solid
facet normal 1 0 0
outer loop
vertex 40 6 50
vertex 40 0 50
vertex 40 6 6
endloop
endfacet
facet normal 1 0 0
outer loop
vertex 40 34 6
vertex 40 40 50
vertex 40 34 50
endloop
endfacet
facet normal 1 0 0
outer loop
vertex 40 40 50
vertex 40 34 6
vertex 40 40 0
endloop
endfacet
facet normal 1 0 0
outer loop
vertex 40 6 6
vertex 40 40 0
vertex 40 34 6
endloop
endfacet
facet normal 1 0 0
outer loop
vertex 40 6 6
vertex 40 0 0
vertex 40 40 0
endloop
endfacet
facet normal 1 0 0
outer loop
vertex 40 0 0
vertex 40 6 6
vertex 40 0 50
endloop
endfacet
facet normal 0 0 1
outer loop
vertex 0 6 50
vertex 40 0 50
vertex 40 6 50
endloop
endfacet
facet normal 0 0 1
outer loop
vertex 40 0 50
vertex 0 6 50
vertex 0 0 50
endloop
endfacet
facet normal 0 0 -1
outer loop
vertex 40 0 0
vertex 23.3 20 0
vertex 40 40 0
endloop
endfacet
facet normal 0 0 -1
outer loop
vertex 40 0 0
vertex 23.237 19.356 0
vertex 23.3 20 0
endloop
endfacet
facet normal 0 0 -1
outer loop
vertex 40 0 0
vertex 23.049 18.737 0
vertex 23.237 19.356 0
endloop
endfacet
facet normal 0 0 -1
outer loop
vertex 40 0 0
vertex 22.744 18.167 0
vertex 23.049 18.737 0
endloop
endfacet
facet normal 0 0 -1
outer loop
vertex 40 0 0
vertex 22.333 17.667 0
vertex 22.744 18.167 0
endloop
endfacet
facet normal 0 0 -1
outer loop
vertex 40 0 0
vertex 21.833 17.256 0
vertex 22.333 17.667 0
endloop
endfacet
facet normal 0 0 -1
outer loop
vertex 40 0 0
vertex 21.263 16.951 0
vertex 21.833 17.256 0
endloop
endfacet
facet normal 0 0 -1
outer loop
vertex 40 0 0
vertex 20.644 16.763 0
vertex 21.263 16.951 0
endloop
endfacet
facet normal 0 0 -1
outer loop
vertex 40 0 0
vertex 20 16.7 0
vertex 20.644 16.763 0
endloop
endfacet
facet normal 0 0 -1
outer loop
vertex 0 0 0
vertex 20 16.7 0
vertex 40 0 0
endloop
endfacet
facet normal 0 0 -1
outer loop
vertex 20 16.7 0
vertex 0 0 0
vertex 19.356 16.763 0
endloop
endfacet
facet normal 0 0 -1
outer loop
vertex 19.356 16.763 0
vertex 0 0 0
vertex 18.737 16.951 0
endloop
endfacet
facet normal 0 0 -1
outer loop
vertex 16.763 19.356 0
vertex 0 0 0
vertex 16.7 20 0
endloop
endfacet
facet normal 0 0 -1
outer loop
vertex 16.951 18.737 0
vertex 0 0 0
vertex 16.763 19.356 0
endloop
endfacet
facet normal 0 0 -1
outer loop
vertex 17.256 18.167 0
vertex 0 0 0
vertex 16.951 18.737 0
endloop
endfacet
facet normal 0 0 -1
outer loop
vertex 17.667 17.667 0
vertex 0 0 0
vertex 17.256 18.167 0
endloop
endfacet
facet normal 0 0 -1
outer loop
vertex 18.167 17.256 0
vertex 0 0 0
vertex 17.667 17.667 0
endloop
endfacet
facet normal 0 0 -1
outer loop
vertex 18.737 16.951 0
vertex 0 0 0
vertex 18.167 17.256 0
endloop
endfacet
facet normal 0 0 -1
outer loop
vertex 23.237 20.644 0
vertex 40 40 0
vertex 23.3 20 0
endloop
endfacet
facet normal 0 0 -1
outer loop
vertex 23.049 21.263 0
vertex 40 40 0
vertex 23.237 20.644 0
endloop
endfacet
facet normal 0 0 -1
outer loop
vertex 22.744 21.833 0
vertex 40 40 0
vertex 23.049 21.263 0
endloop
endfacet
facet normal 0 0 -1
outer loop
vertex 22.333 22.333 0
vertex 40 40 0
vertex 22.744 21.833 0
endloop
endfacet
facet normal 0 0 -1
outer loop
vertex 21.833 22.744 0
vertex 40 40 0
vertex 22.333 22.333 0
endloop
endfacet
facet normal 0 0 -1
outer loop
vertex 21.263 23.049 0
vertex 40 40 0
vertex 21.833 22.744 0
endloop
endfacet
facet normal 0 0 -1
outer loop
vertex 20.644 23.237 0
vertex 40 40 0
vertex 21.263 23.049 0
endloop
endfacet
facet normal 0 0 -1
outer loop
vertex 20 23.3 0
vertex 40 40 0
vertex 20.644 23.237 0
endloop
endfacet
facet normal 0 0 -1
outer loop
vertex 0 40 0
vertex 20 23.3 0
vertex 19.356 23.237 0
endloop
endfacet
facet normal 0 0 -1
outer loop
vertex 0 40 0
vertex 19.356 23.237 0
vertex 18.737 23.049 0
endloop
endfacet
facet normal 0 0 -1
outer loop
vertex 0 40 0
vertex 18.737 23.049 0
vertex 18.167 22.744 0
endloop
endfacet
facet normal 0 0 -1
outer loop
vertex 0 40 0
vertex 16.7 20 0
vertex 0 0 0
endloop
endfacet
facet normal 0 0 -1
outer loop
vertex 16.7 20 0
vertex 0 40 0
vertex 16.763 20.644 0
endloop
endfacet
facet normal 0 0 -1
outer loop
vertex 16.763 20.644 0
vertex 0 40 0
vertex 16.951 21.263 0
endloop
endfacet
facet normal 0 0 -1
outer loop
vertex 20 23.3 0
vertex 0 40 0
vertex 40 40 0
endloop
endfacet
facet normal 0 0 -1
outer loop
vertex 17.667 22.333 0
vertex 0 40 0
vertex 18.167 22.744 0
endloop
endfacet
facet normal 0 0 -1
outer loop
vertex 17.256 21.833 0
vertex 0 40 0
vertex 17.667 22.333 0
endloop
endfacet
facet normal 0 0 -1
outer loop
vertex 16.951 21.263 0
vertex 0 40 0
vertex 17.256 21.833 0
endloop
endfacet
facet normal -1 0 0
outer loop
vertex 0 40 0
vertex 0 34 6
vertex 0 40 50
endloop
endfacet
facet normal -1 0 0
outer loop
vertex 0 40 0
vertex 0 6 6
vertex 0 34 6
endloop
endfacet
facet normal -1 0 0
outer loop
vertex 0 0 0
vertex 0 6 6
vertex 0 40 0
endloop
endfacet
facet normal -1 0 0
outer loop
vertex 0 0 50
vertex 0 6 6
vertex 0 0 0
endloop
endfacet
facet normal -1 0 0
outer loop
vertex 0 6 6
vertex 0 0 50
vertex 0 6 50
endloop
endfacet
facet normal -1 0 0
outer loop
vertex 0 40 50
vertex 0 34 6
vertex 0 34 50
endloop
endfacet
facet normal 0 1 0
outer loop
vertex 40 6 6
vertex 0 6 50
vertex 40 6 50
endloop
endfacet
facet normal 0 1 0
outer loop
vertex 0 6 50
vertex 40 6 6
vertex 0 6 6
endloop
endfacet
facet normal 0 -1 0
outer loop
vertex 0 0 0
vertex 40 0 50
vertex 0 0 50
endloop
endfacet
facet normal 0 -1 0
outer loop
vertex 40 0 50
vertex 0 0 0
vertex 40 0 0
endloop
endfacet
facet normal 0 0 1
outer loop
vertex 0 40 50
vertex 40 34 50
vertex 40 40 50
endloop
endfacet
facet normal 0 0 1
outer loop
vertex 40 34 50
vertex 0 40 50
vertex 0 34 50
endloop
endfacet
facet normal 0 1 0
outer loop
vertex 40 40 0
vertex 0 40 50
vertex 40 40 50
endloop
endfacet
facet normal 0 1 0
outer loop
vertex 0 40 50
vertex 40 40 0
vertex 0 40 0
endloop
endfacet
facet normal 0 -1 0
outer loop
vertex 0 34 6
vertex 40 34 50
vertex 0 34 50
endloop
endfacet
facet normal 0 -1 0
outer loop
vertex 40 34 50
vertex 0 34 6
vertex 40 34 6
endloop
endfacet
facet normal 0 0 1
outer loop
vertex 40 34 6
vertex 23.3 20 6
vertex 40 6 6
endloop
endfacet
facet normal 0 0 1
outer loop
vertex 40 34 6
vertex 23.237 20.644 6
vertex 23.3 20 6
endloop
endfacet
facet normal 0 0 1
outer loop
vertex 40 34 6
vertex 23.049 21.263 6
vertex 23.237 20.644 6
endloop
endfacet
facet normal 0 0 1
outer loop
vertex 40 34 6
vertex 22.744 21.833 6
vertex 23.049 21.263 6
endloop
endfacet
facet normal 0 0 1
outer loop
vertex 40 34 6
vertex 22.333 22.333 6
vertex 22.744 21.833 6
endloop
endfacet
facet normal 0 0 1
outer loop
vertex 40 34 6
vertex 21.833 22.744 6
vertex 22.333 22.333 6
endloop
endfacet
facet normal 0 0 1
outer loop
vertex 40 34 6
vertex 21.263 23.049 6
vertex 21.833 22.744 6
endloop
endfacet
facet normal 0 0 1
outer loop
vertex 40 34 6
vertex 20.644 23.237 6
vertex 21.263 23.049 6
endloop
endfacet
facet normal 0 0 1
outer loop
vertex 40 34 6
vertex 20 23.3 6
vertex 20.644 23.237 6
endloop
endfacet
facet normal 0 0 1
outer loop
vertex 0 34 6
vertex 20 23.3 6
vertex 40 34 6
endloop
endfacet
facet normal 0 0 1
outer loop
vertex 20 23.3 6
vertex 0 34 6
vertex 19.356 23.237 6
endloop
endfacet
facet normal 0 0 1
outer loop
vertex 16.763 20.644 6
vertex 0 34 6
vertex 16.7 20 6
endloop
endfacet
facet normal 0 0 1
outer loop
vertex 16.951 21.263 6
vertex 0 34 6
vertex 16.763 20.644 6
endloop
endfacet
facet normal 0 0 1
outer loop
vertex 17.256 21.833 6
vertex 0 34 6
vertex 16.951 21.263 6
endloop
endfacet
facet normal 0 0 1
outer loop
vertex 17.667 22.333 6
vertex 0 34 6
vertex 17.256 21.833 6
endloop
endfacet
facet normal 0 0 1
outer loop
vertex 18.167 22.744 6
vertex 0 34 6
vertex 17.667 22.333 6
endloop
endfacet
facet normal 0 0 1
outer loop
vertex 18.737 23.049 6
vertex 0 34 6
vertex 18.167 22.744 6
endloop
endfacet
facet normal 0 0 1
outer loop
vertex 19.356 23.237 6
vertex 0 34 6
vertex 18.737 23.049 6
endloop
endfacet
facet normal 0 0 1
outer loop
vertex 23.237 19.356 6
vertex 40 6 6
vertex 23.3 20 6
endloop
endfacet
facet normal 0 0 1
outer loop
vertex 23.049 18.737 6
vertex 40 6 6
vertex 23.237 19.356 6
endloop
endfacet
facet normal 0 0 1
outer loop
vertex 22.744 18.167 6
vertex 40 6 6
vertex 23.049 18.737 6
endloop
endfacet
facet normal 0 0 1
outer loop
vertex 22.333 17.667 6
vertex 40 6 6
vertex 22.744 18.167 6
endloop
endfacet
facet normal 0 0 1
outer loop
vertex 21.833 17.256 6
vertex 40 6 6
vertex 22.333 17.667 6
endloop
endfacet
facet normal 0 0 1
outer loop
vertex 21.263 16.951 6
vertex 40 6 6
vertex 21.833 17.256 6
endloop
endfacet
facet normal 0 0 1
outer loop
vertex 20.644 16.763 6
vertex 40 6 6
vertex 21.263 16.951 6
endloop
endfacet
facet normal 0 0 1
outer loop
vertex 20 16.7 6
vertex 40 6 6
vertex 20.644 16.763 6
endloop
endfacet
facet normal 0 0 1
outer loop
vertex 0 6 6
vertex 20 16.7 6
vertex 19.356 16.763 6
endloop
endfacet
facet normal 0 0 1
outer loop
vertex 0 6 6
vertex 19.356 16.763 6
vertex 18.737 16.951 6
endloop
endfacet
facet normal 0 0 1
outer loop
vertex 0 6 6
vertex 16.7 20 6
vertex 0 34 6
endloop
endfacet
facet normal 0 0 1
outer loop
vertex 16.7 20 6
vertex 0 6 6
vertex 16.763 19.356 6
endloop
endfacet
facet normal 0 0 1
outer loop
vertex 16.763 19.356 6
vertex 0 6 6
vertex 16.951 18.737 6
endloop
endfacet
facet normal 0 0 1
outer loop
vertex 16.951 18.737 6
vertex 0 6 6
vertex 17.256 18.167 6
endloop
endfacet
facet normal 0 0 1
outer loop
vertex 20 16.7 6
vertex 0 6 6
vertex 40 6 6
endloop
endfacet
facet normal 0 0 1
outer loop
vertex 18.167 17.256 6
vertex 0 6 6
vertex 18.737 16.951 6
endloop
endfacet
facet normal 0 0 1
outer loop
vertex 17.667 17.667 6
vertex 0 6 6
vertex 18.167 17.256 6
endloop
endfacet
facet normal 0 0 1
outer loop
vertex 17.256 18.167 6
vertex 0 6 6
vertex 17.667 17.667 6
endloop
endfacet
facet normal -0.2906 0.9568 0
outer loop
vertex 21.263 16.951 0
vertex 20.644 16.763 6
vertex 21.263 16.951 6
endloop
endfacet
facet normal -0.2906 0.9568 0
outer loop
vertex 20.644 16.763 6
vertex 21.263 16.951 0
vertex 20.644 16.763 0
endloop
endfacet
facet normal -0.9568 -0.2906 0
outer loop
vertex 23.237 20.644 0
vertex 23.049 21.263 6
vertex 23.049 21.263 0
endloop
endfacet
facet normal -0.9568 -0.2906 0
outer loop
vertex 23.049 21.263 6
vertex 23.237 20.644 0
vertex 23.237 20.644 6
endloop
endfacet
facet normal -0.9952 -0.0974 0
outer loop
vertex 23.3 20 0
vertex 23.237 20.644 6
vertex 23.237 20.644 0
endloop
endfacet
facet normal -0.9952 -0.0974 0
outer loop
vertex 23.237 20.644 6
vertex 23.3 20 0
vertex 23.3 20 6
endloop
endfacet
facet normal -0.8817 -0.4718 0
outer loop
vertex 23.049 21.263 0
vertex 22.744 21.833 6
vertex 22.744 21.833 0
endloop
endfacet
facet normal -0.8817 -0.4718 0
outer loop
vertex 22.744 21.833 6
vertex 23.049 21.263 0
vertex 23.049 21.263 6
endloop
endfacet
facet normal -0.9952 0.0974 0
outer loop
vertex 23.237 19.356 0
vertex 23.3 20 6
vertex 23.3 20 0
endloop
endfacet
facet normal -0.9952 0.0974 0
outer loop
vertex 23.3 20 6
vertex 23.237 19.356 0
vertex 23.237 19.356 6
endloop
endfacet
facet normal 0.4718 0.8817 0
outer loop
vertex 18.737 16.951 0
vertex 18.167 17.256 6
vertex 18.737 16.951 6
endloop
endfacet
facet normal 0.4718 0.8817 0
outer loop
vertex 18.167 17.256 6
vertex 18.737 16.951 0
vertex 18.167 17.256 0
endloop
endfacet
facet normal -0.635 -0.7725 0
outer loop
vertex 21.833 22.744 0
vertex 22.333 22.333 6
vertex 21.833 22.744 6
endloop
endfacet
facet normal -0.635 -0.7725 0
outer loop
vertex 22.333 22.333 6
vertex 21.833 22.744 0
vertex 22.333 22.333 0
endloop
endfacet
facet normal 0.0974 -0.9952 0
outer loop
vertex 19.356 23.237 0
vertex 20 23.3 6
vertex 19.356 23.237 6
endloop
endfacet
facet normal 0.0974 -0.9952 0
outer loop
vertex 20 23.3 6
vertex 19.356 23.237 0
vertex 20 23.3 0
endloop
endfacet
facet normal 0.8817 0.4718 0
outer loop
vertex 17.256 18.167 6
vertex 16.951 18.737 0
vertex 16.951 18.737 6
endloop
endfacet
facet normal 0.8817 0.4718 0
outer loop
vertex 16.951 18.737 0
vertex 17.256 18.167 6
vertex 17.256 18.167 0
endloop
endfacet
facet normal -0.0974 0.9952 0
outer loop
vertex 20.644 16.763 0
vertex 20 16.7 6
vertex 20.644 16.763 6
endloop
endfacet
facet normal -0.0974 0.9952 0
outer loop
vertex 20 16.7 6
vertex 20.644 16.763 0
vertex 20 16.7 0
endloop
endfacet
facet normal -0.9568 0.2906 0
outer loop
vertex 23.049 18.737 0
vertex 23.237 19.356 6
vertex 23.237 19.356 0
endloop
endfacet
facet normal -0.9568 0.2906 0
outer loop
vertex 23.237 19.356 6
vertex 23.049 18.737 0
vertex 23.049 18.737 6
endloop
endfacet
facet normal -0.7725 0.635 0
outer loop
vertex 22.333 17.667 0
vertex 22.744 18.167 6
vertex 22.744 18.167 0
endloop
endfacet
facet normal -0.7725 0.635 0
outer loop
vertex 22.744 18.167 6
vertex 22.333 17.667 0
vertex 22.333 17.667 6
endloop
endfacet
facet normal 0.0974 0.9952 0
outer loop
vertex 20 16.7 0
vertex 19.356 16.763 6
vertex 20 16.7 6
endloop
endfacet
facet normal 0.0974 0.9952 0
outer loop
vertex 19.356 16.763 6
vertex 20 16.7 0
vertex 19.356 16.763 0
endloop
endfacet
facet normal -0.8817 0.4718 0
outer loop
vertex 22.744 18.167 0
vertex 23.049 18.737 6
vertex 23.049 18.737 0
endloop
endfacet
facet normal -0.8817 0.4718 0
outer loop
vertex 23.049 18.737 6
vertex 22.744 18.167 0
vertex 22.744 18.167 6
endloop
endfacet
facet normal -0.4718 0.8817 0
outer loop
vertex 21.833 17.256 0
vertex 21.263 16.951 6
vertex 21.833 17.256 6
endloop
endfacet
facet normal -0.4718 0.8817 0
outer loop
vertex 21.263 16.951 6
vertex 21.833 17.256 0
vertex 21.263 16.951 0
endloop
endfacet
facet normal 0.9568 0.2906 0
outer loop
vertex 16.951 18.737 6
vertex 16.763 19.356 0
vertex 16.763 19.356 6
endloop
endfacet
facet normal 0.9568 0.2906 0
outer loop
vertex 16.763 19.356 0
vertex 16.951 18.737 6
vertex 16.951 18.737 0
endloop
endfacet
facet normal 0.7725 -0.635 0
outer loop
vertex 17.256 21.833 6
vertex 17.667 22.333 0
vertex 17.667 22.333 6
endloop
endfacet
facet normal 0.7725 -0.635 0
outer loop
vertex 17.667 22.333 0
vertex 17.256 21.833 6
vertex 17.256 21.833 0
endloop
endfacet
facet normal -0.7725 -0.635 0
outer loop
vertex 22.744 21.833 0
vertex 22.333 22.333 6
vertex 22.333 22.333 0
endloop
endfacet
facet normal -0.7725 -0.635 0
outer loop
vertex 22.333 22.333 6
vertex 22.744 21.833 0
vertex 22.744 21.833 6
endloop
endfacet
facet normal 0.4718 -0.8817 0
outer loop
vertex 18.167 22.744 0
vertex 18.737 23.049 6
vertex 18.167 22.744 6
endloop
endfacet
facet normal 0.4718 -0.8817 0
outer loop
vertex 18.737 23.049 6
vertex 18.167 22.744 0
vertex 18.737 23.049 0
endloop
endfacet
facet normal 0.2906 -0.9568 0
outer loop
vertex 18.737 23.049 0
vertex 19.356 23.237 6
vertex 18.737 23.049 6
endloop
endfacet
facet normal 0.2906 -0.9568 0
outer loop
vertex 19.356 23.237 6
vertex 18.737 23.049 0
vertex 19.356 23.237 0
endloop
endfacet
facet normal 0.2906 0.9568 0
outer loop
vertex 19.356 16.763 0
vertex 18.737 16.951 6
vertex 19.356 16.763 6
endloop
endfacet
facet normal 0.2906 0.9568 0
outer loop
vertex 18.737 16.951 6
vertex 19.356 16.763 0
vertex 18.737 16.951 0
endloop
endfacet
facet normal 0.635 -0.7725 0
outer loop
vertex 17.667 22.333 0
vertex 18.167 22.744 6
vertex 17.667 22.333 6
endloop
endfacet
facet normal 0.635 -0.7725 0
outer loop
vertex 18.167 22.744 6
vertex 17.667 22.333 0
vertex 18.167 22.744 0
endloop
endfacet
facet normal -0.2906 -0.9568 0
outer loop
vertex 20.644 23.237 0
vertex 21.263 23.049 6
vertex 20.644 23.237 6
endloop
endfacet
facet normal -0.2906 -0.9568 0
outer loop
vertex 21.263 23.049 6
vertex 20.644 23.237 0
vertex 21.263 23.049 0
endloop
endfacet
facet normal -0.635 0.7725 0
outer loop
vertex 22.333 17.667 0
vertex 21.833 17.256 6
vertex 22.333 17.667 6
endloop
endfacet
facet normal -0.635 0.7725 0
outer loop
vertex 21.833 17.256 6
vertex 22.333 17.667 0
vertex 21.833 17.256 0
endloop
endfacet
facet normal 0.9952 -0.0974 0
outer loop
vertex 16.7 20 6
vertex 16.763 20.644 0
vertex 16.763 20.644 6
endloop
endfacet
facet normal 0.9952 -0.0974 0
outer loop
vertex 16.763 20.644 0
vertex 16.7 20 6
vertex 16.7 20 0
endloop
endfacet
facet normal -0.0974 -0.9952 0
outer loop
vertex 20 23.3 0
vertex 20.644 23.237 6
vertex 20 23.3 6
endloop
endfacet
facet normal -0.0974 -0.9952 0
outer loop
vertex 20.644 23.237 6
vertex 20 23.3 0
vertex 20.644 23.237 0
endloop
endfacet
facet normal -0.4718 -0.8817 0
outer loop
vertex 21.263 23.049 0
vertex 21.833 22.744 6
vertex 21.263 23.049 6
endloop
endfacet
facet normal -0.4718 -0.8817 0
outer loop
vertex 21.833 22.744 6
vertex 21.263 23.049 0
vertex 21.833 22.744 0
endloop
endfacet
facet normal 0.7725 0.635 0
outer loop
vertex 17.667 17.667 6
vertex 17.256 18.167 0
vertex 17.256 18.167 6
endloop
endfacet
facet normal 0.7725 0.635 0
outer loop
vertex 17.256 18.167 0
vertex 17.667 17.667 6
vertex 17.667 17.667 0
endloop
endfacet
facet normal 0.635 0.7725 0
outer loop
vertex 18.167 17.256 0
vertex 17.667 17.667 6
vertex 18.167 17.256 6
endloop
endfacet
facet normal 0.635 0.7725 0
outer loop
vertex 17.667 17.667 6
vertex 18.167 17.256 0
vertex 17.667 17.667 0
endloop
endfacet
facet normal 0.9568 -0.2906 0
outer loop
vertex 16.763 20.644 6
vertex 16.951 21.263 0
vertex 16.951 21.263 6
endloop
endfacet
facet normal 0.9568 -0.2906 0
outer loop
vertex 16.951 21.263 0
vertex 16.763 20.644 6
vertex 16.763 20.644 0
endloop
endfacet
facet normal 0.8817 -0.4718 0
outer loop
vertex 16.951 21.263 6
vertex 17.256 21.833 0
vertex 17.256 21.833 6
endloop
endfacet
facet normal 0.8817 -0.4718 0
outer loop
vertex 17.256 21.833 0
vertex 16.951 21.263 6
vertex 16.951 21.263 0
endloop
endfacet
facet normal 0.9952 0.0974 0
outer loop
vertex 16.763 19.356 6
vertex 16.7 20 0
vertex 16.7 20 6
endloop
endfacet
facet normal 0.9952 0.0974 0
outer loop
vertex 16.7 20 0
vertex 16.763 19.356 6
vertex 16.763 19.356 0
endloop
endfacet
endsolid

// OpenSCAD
$fn = 32;

// ----------------------------------------------------------------------
// U-bracket: 40 x 40 x 50 mm
// ----------------------------------------------------------------------

// --- parameters (mm) ---
base_len = 40;            // outer length, X
channel_w = 40;           // outer width, Y
upright_h = 50;           // upright height, Z
mat_t = 6;                // wall thickness
hole_d = 6.6;             // clearance for M6

module hole_z(px, py) {
  translate([px, py, -2.5]) cylinder(h = mat_t + 5, d = hole_d);
}
module hole_y_pz(pz) {
  /* through both uprights along Y */
  translate([0, -2.5, pz]) rotate([-90, 0, 0]) cylinder(h = channel_w + 5, d = hole_d);
}

module base() {
  cube([base_len, channel_w, mat_t]);
}

module uprights() {
  cube([base_len, mat_t, upright_h]);
  translate([0, channel_w - mat_t, 0]) cube([base_len, mat_t, upright_h]);
}

difference() {
  union() {
    base();
    uprights();
  }
  hole_z(20, 20);
}
